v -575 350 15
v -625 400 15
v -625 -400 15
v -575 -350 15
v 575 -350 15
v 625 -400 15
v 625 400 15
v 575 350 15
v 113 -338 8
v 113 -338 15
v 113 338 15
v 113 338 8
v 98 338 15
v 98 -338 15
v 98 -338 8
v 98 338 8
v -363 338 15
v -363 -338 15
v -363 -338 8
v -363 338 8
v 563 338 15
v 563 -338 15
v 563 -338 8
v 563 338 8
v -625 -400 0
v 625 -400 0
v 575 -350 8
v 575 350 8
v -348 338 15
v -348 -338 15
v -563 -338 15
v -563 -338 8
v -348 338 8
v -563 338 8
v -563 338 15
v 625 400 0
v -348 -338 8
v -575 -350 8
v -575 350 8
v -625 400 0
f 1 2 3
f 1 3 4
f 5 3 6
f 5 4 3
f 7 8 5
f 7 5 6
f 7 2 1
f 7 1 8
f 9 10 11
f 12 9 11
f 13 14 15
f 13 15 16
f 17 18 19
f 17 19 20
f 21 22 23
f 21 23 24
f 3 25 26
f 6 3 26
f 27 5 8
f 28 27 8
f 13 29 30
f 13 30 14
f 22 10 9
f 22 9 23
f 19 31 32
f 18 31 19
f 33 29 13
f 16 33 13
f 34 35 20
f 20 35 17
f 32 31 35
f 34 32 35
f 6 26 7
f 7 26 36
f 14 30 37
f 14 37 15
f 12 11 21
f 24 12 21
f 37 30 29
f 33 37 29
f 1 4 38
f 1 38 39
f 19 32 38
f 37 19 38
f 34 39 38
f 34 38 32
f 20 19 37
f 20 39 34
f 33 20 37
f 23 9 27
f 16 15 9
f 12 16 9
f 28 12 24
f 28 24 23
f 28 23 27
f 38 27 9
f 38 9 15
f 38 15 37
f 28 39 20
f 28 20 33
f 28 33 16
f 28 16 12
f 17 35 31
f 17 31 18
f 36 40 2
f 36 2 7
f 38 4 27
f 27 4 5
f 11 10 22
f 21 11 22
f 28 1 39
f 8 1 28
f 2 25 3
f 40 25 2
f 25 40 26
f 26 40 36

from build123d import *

# Parameters (mm, degrees)
ESQUISSE1_W             = 1250
ESQUISSE1_H             = 800
BOSS_EXTRU_1_DEPTH      = 15
ESQUISSE2_W             = 1150
ESQUISSE2_H             = 700
ESQUISSE2_W_2           = 1126
ESQUISSE2_H_2           = 676
ENL_V_MAT_EXTRU_1_DEPTH = 7
ESQUISSE4_W             = 15
ESQUISSE4_H             = 676
ENL_V_MAT_EXTRU_2_DEPTH = 7


with BuildPart() as part:
    # Esquisse1 → Boss.-Extru.1 (new body)
    with BuildSketch(Plane.XY):
        Rectangle(ESQUISSE1_W, ESQUISSE1_H)
    extrude(amount=BOSS_EXTRU_1_DEPTH)

    # Esquisse2 → Enlèv. mat.-Extru.1 (cut)
    with BuildSketch(Plane.XY.offset(15)):
        Rectangle(ESQUISSE2_W, ESQUISSE2_H)
        Rectangle(ESQUISSE2_W_2, ESQUISSE2_H_2, mode=Mode.SUBTRACT)
    extrude(amount=-ENL_V_MAT_EXTRU_1_DEPTH, mode=Mode.SUBTRACT)

    # Esquisse4 → Enlèv. mat.-Extru.2 (cut)
    with BuildSketch(Plane.XY.offset(15)):
        with Locations((-355.5, 0)):
            Rectangle(ESQUISSE4_W, ESQUISSE4_H)
        with Locations((105.5, 0)):
            Rectangle(ESQUISSE4_W, ESQUISSE4_H)
    extrude(amount=-ENL_V_MAT_EXTRU_2_DEPTH, mode=Mode.SUBTRACT)


solid = part.part
